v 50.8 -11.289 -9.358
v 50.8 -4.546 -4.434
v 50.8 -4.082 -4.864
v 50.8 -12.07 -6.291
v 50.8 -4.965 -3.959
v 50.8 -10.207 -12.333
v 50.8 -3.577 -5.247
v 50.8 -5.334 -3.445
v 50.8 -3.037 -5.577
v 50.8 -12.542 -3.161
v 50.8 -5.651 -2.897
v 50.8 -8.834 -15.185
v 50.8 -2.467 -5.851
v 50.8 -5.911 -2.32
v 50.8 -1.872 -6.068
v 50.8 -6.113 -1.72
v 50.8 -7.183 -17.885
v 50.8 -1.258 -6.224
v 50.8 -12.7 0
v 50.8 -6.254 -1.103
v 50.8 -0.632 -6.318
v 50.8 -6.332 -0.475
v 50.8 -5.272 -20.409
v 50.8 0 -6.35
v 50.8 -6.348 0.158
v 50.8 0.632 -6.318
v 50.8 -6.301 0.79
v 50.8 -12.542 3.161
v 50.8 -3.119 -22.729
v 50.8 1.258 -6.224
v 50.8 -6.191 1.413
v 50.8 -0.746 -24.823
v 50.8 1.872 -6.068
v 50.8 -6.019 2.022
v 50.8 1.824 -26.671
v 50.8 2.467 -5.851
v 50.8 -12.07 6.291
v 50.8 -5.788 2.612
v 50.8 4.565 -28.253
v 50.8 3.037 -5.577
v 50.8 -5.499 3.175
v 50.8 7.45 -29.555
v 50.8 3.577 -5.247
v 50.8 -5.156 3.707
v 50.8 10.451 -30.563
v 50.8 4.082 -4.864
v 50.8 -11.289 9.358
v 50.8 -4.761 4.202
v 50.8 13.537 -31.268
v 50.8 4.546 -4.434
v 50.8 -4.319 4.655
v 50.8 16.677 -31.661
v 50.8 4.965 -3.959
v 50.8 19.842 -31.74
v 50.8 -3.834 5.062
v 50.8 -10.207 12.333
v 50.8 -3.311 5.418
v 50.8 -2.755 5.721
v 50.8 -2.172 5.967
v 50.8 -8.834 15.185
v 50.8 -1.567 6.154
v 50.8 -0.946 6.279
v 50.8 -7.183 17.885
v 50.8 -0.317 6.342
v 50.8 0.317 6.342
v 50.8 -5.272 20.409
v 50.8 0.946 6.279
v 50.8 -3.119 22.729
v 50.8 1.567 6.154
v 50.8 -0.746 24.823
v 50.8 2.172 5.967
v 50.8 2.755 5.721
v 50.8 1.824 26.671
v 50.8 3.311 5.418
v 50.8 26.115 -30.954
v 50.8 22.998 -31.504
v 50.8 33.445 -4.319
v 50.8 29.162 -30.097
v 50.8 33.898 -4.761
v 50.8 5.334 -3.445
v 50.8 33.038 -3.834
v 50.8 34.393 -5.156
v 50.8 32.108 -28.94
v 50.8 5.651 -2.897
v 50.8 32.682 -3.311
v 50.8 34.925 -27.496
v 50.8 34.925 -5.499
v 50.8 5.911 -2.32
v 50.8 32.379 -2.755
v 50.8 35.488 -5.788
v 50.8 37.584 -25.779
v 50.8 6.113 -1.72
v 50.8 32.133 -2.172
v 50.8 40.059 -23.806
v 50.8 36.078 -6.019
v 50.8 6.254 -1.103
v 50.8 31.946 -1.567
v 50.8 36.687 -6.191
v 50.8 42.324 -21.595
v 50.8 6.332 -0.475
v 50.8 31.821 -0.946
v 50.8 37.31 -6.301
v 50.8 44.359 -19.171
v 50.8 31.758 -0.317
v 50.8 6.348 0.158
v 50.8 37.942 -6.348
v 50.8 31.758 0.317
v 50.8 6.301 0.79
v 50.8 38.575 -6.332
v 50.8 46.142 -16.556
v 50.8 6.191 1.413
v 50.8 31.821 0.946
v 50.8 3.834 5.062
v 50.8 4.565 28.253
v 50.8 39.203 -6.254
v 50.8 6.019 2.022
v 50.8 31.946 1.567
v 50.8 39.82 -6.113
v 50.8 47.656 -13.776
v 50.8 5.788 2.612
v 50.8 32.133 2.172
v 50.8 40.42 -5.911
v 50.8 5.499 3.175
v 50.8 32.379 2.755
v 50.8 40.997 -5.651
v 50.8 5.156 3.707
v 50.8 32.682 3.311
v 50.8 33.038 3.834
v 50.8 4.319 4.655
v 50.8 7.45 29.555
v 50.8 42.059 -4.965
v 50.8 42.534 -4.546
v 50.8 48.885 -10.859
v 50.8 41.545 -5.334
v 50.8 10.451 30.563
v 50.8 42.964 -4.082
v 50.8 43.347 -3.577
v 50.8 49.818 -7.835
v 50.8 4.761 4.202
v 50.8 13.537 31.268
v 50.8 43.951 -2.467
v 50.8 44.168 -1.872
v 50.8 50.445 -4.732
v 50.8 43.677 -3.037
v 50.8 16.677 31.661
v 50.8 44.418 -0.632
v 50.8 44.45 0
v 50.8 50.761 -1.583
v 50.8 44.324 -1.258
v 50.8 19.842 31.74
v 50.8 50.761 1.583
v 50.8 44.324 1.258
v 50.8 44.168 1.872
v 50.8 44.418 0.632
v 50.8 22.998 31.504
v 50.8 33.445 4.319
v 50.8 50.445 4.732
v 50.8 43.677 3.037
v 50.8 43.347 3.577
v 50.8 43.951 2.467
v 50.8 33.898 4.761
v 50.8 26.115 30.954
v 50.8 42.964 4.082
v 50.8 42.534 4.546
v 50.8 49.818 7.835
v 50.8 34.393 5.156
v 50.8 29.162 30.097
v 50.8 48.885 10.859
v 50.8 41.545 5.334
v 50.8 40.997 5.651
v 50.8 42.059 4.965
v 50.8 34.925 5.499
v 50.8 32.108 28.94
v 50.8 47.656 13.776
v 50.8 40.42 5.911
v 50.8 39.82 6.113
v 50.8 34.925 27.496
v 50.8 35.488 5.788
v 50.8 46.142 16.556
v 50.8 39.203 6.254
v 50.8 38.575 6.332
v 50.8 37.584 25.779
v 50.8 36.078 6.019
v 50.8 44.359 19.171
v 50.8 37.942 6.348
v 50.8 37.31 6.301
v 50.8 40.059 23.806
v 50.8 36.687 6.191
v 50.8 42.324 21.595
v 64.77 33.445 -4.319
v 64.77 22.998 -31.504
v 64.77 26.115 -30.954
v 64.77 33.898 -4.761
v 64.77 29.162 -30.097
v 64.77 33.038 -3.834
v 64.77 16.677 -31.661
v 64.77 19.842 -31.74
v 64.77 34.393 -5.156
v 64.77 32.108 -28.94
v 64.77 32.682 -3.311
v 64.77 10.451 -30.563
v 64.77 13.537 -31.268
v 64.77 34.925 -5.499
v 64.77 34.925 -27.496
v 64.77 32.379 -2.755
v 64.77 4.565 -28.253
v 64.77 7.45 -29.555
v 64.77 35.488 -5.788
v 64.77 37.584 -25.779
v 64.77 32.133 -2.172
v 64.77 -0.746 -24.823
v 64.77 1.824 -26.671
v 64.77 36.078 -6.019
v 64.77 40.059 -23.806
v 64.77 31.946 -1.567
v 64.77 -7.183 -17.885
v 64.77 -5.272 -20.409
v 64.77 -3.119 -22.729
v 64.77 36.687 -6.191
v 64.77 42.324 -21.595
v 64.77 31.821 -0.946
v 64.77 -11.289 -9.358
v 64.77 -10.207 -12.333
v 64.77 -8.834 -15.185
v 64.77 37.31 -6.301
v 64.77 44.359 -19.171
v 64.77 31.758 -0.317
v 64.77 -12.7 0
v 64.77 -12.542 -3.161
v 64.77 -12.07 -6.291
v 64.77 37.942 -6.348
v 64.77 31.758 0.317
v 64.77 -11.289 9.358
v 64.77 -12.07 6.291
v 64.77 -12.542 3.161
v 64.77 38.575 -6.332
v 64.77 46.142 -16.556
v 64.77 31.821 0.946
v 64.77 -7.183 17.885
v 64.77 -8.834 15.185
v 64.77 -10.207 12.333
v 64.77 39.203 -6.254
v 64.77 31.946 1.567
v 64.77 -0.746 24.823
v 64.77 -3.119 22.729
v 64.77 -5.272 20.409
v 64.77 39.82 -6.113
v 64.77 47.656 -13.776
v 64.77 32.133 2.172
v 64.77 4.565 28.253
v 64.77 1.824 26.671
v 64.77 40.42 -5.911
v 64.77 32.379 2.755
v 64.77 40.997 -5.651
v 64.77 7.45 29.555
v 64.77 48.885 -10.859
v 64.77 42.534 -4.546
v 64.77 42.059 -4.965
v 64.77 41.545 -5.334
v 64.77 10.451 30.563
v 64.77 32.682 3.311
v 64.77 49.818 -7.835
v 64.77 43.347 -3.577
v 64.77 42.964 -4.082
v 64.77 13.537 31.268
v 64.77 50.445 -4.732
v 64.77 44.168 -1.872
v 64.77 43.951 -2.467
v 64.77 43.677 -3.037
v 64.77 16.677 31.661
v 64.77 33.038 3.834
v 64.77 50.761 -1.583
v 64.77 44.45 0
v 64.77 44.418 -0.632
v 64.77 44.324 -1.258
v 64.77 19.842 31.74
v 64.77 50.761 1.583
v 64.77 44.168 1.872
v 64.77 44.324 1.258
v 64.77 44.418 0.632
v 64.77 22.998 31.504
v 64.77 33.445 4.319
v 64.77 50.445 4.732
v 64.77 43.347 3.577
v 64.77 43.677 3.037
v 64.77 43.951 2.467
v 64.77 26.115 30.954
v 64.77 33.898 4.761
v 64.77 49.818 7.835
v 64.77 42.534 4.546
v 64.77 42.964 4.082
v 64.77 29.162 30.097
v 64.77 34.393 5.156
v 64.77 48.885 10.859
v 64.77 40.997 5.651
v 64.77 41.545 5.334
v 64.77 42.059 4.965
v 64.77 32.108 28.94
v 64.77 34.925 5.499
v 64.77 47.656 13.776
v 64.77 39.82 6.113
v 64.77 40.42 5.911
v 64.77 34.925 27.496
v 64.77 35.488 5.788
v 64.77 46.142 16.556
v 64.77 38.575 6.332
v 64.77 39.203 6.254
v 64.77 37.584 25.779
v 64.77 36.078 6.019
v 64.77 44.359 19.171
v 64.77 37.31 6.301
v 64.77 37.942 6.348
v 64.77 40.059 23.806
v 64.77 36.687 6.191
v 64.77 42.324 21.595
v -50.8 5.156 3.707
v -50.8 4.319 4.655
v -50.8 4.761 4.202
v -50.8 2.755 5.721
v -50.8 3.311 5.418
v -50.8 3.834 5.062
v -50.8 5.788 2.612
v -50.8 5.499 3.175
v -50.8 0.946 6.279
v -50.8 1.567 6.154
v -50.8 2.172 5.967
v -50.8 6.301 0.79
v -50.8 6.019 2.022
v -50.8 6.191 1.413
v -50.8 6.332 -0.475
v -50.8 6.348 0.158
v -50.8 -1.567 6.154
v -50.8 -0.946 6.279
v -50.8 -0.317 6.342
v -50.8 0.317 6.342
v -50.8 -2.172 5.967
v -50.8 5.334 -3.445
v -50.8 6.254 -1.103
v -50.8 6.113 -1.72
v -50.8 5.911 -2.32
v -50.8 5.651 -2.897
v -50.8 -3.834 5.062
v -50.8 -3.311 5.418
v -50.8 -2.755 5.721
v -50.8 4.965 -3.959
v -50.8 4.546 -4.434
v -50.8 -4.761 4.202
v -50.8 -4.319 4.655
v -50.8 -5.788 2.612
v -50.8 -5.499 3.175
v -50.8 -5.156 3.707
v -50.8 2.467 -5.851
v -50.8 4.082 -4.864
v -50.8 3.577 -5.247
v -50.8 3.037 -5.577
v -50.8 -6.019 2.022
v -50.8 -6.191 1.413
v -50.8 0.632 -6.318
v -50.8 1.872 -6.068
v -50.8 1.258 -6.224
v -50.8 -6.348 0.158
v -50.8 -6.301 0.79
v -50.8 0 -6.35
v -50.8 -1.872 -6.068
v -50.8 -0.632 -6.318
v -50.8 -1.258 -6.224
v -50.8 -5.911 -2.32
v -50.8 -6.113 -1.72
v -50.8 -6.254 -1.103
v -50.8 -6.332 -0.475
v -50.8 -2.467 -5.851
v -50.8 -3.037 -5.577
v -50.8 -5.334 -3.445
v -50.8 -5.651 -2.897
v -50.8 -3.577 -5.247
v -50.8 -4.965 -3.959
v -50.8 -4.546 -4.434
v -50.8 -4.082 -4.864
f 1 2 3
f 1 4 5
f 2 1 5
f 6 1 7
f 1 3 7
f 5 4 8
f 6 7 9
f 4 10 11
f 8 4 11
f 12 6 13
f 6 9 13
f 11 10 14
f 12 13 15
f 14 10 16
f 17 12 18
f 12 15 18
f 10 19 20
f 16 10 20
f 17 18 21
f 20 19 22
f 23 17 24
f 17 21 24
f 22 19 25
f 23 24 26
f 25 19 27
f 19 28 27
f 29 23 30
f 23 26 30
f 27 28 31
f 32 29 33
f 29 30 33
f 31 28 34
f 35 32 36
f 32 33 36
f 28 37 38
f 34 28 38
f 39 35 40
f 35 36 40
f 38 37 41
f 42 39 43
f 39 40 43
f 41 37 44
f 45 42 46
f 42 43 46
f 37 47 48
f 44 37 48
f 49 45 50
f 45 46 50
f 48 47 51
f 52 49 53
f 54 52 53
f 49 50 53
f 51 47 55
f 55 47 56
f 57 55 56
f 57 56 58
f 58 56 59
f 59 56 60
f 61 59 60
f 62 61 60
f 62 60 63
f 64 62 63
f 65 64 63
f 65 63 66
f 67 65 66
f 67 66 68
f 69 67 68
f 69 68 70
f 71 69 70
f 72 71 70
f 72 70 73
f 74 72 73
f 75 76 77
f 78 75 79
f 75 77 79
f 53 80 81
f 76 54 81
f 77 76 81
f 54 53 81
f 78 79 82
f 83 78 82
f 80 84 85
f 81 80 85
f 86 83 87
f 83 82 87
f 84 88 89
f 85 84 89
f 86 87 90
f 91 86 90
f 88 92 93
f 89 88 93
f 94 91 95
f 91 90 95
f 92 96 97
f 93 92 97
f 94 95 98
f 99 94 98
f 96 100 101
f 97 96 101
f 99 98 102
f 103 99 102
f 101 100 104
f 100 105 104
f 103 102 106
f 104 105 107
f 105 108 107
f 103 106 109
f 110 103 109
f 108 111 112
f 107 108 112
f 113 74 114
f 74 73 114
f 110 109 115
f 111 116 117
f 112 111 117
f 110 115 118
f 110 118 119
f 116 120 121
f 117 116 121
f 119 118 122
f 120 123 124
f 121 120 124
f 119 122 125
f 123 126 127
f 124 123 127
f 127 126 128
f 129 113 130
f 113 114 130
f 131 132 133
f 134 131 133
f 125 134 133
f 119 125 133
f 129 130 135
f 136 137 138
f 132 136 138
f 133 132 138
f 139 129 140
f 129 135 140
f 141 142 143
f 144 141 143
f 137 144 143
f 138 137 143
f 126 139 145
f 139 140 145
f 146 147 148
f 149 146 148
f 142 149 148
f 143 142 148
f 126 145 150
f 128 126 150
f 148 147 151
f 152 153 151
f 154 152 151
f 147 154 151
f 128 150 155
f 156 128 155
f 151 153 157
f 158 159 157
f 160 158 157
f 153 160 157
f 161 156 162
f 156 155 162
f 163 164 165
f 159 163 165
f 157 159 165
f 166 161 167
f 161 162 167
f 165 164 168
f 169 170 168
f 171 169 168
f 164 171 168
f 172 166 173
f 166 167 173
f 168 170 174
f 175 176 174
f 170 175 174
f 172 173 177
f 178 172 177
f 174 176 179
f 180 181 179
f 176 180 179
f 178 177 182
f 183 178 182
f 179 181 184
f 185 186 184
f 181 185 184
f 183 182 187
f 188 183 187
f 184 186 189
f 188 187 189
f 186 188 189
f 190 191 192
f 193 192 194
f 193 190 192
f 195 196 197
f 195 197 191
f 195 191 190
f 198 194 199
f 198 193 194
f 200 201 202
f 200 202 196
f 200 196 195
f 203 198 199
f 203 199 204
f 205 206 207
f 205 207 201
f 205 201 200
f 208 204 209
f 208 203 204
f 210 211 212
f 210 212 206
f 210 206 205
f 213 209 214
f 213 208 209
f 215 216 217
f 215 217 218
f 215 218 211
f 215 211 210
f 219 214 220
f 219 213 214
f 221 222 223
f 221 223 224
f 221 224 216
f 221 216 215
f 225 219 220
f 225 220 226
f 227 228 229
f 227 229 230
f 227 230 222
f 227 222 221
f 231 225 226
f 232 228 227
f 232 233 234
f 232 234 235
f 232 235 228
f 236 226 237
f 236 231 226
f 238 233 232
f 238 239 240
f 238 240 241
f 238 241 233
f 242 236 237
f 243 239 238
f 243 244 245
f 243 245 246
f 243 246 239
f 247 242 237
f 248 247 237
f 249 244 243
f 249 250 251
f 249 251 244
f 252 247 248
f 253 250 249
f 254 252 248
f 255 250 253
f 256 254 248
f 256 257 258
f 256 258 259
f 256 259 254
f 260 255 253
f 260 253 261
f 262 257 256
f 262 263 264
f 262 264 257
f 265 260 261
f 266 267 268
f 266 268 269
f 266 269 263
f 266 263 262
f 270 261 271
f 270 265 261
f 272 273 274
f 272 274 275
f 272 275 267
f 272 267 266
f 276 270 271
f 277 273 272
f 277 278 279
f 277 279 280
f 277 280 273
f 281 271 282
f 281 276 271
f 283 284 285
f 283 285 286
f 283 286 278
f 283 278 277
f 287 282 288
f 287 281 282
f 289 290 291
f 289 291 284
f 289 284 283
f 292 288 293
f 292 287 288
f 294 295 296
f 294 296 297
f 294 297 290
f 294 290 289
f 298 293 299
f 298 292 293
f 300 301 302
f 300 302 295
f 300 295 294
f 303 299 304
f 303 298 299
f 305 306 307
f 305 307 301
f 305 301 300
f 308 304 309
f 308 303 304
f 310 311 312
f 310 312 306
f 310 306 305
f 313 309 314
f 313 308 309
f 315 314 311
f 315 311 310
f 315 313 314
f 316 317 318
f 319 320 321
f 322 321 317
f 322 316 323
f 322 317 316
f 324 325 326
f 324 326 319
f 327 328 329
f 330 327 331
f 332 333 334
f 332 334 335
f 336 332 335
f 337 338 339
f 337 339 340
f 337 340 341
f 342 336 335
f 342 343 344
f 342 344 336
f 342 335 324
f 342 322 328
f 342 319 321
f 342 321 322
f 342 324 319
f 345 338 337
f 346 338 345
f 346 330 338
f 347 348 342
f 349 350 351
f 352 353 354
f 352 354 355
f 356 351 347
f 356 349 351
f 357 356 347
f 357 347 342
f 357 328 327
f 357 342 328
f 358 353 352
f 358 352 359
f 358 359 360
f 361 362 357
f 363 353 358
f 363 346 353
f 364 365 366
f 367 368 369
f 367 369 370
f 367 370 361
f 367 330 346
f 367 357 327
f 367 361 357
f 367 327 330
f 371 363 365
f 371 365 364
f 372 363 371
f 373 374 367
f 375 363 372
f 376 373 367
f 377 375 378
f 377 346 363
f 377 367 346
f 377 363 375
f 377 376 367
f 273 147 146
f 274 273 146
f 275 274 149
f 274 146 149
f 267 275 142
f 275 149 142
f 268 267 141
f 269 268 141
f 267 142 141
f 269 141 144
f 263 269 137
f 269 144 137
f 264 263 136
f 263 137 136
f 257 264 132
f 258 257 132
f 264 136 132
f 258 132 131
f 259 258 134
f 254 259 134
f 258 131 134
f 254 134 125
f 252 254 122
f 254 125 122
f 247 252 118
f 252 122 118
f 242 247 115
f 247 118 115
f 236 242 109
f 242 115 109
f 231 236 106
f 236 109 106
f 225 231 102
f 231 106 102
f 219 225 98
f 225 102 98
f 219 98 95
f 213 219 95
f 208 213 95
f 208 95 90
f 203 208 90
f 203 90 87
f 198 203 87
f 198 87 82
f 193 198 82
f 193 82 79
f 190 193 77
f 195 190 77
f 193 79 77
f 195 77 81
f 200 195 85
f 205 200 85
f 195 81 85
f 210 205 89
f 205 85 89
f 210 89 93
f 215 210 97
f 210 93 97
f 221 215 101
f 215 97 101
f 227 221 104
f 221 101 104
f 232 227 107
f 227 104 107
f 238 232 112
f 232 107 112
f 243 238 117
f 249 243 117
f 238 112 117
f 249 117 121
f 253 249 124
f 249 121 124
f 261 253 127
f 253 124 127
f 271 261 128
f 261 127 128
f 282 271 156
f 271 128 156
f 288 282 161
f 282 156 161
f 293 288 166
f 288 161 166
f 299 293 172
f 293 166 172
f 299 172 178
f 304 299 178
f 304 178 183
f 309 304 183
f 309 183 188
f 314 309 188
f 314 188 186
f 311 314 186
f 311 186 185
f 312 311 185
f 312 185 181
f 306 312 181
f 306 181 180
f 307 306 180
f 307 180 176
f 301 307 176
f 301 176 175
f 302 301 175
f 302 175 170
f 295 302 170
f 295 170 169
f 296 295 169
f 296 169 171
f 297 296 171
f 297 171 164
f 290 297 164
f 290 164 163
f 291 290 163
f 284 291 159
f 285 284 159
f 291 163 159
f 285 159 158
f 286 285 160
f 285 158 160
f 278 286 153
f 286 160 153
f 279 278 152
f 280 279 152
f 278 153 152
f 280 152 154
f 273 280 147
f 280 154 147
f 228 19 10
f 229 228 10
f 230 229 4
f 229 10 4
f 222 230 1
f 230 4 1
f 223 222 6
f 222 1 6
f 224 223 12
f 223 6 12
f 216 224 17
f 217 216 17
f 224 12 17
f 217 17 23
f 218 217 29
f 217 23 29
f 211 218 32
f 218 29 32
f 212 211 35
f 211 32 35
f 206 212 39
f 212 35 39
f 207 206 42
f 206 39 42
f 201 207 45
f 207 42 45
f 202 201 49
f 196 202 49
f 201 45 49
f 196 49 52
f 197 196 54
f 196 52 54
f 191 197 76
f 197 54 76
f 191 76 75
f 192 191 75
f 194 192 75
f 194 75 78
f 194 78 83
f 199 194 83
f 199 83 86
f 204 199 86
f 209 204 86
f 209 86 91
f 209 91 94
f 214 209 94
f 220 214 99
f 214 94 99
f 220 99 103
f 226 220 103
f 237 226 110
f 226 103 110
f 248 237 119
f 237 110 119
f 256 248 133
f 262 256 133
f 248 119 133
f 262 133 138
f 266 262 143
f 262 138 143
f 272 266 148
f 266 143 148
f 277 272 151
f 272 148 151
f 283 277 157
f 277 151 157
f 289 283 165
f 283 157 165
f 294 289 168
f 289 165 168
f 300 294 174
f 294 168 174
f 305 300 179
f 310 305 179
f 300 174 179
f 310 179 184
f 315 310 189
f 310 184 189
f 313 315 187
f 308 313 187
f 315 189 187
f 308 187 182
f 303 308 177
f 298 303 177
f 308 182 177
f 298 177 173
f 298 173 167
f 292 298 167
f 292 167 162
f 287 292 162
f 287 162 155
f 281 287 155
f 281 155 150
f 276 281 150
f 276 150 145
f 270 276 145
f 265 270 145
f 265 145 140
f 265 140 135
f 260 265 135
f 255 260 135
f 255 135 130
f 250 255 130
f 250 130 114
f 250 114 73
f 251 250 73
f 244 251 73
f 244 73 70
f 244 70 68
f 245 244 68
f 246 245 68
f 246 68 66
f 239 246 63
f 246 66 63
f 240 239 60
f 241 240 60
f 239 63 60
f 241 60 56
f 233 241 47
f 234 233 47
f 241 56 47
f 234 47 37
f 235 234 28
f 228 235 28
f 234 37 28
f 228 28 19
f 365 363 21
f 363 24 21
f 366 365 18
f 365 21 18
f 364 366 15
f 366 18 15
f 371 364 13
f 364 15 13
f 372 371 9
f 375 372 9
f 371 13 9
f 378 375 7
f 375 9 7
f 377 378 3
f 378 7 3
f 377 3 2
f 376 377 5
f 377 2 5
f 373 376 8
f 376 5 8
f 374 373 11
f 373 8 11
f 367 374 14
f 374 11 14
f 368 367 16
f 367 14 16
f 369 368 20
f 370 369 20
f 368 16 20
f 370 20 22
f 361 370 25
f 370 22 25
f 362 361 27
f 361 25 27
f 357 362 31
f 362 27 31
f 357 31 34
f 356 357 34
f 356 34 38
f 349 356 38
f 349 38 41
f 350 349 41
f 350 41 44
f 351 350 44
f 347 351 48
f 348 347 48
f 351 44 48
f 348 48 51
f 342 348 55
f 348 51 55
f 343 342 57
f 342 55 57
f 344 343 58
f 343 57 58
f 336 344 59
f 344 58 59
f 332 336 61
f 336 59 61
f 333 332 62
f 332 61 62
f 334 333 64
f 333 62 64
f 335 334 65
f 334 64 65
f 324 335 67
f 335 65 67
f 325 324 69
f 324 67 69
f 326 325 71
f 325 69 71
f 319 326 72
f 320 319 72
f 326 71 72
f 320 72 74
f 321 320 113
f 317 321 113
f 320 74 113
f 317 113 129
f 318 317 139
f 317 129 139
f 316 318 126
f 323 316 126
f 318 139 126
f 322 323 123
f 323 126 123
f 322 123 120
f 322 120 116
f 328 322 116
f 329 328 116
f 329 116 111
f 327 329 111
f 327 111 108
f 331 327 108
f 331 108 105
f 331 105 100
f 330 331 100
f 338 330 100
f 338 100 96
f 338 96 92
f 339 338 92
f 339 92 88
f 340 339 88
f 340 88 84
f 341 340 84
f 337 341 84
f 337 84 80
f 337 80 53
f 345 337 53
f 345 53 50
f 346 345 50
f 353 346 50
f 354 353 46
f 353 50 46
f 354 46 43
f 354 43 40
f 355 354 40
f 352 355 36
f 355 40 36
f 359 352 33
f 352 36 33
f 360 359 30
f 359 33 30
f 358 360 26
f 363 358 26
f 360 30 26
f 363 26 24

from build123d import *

# Parameters (mm, degrees)
F0_W     = 101.6
F0_H     = 6.35
F3_DEPTH = 13.97
F4_DEPTH = 2.794


with BuildPart() as f1:
    # F0 (on Front) → F1 (revolve)
    with BuildSketch(Plane.XZ):
        with Locations((0, -3.175)):
            Rectangle(F0_W, F0_H)
    revolve(axis=Axis((-107.179771, 0, 0), (-1, 0, 0)))

    # F2 (on face) → F3 (join)
    with BuildSketch(Plane.YZ.offset(50.8)):
        with BuildLine():
            ThreePointArc((31.75, 0), (38.1, 6.35), (44.45, 0))
            Line((44.45, 0), (50.8, 0))
            ThreePointArc((50.8, 0), (19.05, 31.75), (-12.7, 0))
            Line((-12.7, 0), (31.75, 0))
        make_face()
        with BuildLine():
            Line((50.8, 0), (44.45, 0))
            ThreePointArc((44.45, 0), (38.1, -6.35), (31.75, 0))
            Line((31.75, 0), (-12.7, 0))
            ThreePointArc((-12.7, 0), (19.05, -31.75), (50.8, 0))
        make_face()
    extrude(amount=F3_DEPTH)


with BuildPart() as f4:
    # F2 (on face) → F4 (new body)
    with BuildSketch(Plane.YZ.offset(50.8)):
        with BuildLine():
            Line((50.8, 0), (44.45, 0))
            ThreePointArc((44.45, 0), (38.1, -6.35), (31.75, 0))
            Line((31.75, 0), (6.35, 0))
            ThreePointArc((6.35, 0), (0, -6.35), (-6.35, 0))
            Line((-6.35, 0), (-12.7, 0))
            ThreePointArc((-12.7, 0), (19.05, -31.75), (50.8, 0))
        make_face()
        with BuildLine():
            ThreePointArc((31.75, 0), (38.1, 6.35), (44.45, 0))
            Line((44.45, 0), (50.8, 0))
            ThreePointArc((50.8, 0), (19.05, 31.75), (-12.7, 0))
            Line((-12.7, 0), (-6.35, 0))
            ThreePointArc((-6.35, 0), (0, 6.35), (6.35, 0))
            Line((6.35, 0), (31.75, 0))
        make_face()
    extrude(amount=F4_DEPTH)


solid = f1.part
